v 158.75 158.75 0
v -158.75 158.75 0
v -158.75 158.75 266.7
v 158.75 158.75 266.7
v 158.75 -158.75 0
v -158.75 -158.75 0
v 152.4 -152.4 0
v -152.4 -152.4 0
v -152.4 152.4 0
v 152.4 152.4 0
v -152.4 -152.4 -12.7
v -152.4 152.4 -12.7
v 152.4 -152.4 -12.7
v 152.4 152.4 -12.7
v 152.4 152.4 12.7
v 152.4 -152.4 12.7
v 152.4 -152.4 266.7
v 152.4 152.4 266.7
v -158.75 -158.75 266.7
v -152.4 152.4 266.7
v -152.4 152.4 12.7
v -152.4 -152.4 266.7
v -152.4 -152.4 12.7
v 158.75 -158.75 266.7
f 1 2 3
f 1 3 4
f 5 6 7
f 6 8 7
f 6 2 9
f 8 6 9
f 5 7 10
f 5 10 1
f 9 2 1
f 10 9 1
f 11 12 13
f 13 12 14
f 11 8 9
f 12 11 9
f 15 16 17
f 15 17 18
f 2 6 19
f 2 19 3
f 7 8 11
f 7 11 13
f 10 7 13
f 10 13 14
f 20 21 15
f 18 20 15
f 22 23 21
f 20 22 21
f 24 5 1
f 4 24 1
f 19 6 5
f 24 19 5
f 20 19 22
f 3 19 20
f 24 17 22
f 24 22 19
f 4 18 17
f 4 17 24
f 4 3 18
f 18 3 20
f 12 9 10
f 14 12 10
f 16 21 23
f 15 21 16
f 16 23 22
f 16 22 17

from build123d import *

# Parameters (mm, degrees)
SKETCH001_W  = 317.5
SKETCH001_H  = 317.5
PAD001_DEPTH = 266.7
SKETCH_W     = 304.8
SKETCH_H     = 304.8
POCKET_DEPTH = 254.001
SKETCH002_W  = 304.8
SKETCH002_H  = 304.8
PAD_DEPTH    = 12.7


with BuildPart() as part:
    # Sketch001 → Pad001 (new body)
    with BuildSketch(Plane.XY):
        Rectangle(SKETCH001_W, SKETCH001_H)
    extrude(amount=PAD001_DEPTH)

    # Sketch → Pocket (cut, through all)
    with BuildSketch(Plane.XY.offset(12.7)):
        Rectangle(SKETCH_W, SKETCH_H)
    extrude(amount=POCKET_DEPTH, mode=Mode.SUBTRACT)

    # Sketch002 → Pad (join)
    with BuildSketch(Plane.XY):
        Rectangle(SKETCH002_W, SKETCH002_H)
    extrude(amount=-PAD_DEPTH)


solid = part.part
